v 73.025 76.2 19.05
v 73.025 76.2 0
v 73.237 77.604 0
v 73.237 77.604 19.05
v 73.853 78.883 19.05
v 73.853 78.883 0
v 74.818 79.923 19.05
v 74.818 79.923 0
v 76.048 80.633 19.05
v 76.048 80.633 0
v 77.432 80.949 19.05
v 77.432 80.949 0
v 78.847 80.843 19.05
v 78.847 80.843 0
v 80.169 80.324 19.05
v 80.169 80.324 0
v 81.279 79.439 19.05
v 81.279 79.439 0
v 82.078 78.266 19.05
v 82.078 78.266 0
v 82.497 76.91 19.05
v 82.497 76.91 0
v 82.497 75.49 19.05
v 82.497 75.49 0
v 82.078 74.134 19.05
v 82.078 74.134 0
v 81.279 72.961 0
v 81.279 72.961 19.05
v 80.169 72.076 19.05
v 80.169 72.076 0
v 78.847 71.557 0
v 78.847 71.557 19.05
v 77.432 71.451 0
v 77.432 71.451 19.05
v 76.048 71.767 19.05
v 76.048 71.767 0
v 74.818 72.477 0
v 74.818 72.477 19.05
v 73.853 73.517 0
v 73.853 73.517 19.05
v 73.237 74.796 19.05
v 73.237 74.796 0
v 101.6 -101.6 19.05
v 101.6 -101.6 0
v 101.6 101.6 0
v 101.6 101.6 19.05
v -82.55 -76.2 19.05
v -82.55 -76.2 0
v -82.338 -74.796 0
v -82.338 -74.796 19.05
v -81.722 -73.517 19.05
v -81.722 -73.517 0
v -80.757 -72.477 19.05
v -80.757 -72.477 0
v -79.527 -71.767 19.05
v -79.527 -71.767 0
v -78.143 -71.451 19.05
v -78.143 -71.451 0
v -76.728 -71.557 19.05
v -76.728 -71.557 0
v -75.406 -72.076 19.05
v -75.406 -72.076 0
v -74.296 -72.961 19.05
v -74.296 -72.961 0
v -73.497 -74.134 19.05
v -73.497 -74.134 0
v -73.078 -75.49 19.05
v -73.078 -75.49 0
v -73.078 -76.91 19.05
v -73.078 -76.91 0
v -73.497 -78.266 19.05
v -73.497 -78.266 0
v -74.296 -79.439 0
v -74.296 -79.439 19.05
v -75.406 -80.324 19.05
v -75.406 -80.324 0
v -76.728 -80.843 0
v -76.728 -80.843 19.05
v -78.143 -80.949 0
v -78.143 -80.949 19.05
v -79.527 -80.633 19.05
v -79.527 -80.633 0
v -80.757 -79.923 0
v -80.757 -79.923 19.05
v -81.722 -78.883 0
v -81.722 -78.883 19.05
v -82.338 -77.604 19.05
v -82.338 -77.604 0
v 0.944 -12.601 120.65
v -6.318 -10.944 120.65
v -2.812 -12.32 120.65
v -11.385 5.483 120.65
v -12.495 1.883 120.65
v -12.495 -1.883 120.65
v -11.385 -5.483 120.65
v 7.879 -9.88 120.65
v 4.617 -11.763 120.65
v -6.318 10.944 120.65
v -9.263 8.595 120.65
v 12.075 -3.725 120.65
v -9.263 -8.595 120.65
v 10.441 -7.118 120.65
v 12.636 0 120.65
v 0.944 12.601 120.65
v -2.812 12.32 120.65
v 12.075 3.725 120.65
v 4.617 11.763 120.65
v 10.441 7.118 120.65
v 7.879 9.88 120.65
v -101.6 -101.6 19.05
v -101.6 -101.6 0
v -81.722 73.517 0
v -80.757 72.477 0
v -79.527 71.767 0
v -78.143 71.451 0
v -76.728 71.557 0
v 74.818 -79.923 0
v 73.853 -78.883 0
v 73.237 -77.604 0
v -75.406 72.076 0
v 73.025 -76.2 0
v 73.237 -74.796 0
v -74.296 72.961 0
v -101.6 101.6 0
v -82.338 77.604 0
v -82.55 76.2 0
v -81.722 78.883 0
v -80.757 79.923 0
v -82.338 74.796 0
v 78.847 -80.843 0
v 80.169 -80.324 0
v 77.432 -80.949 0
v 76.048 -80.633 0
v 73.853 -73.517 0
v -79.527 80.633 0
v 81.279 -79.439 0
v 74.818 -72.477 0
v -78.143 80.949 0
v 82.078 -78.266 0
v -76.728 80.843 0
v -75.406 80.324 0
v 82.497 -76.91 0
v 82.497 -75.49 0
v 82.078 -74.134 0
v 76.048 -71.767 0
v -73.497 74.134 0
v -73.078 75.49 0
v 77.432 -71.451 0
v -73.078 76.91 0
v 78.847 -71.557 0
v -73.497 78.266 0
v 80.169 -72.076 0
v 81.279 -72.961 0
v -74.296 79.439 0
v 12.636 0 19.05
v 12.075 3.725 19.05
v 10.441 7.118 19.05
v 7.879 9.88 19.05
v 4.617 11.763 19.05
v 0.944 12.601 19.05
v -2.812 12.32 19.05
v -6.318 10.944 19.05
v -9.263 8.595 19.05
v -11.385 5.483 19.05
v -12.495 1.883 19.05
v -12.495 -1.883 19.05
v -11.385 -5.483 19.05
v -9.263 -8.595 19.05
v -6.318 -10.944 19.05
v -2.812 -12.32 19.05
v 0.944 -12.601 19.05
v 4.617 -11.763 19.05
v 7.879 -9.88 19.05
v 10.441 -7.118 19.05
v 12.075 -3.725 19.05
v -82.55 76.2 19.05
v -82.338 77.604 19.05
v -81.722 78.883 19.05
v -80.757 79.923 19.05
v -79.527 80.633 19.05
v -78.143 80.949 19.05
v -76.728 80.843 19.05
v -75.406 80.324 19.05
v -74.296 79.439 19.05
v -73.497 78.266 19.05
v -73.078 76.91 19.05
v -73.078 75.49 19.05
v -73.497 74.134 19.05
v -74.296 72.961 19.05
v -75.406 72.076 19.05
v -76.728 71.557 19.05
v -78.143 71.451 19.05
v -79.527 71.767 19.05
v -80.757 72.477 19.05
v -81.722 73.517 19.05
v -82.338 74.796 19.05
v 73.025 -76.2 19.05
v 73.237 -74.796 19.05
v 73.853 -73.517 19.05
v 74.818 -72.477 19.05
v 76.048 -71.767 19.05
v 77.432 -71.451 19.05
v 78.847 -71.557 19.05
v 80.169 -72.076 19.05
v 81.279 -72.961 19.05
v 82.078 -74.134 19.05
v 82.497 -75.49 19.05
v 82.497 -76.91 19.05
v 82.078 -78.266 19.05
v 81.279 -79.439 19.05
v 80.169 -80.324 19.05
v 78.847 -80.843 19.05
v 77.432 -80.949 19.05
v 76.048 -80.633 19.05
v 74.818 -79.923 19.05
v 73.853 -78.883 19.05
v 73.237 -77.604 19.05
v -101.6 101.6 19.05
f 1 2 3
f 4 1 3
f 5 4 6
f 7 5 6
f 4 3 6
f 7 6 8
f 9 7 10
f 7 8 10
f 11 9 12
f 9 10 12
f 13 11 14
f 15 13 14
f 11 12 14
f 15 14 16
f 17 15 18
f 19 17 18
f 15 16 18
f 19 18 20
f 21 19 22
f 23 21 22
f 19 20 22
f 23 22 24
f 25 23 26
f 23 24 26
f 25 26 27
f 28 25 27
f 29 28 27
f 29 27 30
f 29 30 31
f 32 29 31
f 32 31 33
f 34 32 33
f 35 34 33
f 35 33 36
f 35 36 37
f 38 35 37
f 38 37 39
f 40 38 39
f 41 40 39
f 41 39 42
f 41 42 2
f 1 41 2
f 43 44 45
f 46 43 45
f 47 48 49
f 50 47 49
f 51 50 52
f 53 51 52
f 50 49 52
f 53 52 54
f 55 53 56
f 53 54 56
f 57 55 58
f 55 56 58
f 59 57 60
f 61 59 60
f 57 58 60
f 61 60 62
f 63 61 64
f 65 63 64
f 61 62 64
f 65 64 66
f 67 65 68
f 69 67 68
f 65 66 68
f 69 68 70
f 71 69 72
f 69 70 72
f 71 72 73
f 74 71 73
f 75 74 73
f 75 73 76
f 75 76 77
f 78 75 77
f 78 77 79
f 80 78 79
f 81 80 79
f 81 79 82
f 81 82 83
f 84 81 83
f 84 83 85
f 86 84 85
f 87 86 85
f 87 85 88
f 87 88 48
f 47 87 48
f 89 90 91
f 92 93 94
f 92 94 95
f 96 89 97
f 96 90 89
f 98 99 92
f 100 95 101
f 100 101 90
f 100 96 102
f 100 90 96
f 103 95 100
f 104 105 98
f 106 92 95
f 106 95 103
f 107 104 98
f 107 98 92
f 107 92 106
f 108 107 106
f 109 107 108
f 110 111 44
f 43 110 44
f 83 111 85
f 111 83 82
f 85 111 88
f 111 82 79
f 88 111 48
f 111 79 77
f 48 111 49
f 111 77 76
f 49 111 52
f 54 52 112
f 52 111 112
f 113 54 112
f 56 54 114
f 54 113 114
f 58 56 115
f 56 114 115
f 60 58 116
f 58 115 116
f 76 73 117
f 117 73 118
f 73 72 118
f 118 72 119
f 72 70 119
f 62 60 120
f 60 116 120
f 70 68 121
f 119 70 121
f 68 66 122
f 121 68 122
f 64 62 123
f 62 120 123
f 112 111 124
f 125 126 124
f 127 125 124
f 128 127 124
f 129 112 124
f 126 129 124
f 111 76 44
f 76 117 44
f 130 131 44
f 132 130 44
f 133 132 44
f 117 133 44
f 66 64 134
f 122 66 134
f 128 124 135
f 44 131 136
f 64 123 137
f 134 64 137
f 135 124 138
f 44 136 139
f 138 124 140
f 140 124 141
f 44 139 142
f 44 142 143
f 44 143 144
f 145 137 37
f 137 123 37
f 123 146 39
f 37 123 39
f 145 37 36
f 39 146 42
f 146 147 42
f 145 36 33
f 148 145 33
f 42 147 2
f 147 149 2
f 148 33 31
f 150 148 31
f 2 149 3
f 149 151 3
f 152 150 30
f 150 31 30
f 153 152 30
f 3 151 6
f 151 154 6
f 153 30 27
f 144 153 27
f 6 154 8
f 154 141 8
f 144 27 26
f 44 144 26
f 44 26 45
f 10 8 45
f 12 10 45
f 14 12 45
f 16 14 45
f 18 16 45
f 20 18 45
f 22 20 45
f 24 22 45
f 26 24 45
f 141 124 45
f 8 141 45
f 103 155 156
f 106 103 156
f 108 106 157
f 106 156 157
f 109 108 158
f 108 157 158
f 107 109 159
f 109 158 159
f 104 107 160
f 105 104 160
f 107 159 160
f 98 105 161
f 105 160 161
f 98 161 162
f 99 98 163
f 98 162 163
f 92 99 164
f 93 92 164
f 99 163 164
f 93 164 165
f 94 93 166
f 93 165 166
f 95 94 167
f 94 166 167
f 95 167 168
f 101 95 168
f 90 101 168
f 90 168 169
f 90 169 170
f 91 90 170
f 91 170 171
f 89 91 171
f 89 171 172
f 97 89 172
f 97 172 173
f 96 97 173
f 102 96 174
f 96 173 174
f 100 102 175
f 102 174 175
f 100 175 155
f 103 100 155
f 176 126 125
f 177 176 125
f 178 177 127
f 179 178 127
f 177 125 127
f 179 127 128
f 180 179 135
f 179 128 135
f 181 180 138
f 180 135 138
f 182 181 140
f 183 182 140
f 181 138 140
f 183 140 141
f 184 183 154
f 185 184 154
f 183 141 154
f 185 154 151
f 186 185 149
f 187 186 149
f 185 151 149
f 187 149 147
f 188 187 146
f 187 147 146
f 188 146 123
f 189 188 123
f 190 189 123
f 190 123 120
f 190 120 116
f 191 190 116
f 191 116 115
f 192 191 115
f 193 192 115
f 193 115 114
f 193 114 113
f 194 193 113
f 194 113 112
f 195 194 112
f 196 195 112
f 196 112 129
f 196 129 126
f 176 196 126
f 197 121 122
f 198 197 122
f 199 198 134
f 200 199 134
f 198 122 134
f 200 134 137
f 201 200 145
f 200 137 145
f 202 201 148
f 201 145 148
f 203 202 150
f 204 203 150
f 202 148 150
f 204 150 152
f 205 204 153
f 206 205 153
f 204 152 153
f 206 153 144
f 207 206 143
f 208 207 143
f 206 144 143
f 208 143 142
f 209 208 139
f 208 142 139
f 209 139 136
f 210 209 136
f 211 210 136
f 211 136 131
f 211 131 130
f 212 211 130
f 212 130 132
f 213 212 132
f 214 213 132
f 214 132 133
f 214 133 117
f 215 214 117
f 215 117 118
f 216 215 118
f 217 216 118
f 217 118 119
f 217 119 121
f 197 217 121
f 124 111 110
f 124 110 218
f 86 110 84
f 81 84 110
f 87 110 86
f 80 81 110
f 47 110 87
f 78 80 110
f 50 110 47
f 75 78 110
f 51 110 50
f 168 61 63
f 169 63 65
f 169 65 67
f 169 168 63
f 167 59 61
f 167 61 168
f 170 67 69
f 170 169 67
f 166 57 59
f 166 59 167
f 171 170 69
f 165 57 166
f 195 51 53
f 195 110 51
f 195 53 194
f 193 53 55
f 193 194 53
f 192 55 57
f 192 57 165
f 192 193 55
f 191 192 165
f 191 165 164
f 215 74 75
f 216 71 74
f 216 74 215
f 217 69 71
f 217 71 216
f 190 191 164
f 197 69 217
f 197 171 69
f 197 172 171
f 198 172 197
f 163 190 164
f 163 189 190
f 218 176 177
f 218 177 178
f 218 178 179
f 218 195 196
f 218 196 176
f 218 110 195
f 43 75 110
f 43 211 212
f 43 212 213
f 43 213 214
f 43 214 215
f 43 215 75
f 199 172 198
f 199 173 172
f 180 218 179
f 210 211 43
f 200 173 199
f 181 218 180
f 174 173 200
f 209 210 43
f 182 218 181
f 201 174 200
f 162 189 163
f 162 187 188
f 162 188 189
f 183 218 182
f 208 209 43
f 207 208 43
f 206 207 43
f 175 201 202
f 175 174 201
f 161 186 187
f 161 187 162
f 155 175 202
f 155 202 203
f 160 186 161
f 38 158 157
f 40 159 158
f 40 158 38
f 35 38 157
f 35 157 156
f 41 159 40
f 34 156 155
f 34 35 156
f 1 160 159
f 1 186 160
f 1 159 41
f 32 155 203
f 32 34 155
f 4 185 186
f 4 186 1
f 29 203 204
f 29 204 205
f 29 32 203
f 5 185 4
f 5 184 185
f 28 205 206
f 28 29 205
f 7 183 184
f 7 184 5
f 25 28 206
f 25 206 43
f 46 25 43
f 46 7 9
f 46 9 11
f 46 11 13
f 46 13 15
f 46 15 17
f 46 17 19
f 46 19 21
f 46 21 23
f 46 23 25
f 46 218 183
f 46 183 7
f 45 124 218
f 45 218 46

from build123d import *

# Parameters (mm, degrees)
F0_W     = 203.2
F0_H     = 203.2
F1_DEPTH = 19.05
F3_D     = 9.525
F4_R     = 12.6365
F5_DEPTH = 101.6


# Not quite as in the source:
# - a length typed as a fraction of an inch, garbled in the dataset ("3 / 203.2 mm" for 3/8 in), is restored


with BuildPart() as f1:
    # F0 (on Top) → F1 (new body)
    with BuildSketch(Plane.XY):
        Rectangle(F0_W, F0_H)
    extrude(amount=F1_DEPTH)

    # F3 (through all)
    with Locations(Plane.XY.offset(19.05)):
        with Locations((-77.7875, 76.2), (77.7875, 76.2), (-77.7875, -76.2), (77.7875, -76.2)):
            Hole(F3_D / 2)

    # F4 (on face) → F5 (join)
    with BuildSketch(Plane.XY.offset(19.05)):
        Circle(F4_R)
    extrude(amount=F5_DEPTH)


solid = f1.part
